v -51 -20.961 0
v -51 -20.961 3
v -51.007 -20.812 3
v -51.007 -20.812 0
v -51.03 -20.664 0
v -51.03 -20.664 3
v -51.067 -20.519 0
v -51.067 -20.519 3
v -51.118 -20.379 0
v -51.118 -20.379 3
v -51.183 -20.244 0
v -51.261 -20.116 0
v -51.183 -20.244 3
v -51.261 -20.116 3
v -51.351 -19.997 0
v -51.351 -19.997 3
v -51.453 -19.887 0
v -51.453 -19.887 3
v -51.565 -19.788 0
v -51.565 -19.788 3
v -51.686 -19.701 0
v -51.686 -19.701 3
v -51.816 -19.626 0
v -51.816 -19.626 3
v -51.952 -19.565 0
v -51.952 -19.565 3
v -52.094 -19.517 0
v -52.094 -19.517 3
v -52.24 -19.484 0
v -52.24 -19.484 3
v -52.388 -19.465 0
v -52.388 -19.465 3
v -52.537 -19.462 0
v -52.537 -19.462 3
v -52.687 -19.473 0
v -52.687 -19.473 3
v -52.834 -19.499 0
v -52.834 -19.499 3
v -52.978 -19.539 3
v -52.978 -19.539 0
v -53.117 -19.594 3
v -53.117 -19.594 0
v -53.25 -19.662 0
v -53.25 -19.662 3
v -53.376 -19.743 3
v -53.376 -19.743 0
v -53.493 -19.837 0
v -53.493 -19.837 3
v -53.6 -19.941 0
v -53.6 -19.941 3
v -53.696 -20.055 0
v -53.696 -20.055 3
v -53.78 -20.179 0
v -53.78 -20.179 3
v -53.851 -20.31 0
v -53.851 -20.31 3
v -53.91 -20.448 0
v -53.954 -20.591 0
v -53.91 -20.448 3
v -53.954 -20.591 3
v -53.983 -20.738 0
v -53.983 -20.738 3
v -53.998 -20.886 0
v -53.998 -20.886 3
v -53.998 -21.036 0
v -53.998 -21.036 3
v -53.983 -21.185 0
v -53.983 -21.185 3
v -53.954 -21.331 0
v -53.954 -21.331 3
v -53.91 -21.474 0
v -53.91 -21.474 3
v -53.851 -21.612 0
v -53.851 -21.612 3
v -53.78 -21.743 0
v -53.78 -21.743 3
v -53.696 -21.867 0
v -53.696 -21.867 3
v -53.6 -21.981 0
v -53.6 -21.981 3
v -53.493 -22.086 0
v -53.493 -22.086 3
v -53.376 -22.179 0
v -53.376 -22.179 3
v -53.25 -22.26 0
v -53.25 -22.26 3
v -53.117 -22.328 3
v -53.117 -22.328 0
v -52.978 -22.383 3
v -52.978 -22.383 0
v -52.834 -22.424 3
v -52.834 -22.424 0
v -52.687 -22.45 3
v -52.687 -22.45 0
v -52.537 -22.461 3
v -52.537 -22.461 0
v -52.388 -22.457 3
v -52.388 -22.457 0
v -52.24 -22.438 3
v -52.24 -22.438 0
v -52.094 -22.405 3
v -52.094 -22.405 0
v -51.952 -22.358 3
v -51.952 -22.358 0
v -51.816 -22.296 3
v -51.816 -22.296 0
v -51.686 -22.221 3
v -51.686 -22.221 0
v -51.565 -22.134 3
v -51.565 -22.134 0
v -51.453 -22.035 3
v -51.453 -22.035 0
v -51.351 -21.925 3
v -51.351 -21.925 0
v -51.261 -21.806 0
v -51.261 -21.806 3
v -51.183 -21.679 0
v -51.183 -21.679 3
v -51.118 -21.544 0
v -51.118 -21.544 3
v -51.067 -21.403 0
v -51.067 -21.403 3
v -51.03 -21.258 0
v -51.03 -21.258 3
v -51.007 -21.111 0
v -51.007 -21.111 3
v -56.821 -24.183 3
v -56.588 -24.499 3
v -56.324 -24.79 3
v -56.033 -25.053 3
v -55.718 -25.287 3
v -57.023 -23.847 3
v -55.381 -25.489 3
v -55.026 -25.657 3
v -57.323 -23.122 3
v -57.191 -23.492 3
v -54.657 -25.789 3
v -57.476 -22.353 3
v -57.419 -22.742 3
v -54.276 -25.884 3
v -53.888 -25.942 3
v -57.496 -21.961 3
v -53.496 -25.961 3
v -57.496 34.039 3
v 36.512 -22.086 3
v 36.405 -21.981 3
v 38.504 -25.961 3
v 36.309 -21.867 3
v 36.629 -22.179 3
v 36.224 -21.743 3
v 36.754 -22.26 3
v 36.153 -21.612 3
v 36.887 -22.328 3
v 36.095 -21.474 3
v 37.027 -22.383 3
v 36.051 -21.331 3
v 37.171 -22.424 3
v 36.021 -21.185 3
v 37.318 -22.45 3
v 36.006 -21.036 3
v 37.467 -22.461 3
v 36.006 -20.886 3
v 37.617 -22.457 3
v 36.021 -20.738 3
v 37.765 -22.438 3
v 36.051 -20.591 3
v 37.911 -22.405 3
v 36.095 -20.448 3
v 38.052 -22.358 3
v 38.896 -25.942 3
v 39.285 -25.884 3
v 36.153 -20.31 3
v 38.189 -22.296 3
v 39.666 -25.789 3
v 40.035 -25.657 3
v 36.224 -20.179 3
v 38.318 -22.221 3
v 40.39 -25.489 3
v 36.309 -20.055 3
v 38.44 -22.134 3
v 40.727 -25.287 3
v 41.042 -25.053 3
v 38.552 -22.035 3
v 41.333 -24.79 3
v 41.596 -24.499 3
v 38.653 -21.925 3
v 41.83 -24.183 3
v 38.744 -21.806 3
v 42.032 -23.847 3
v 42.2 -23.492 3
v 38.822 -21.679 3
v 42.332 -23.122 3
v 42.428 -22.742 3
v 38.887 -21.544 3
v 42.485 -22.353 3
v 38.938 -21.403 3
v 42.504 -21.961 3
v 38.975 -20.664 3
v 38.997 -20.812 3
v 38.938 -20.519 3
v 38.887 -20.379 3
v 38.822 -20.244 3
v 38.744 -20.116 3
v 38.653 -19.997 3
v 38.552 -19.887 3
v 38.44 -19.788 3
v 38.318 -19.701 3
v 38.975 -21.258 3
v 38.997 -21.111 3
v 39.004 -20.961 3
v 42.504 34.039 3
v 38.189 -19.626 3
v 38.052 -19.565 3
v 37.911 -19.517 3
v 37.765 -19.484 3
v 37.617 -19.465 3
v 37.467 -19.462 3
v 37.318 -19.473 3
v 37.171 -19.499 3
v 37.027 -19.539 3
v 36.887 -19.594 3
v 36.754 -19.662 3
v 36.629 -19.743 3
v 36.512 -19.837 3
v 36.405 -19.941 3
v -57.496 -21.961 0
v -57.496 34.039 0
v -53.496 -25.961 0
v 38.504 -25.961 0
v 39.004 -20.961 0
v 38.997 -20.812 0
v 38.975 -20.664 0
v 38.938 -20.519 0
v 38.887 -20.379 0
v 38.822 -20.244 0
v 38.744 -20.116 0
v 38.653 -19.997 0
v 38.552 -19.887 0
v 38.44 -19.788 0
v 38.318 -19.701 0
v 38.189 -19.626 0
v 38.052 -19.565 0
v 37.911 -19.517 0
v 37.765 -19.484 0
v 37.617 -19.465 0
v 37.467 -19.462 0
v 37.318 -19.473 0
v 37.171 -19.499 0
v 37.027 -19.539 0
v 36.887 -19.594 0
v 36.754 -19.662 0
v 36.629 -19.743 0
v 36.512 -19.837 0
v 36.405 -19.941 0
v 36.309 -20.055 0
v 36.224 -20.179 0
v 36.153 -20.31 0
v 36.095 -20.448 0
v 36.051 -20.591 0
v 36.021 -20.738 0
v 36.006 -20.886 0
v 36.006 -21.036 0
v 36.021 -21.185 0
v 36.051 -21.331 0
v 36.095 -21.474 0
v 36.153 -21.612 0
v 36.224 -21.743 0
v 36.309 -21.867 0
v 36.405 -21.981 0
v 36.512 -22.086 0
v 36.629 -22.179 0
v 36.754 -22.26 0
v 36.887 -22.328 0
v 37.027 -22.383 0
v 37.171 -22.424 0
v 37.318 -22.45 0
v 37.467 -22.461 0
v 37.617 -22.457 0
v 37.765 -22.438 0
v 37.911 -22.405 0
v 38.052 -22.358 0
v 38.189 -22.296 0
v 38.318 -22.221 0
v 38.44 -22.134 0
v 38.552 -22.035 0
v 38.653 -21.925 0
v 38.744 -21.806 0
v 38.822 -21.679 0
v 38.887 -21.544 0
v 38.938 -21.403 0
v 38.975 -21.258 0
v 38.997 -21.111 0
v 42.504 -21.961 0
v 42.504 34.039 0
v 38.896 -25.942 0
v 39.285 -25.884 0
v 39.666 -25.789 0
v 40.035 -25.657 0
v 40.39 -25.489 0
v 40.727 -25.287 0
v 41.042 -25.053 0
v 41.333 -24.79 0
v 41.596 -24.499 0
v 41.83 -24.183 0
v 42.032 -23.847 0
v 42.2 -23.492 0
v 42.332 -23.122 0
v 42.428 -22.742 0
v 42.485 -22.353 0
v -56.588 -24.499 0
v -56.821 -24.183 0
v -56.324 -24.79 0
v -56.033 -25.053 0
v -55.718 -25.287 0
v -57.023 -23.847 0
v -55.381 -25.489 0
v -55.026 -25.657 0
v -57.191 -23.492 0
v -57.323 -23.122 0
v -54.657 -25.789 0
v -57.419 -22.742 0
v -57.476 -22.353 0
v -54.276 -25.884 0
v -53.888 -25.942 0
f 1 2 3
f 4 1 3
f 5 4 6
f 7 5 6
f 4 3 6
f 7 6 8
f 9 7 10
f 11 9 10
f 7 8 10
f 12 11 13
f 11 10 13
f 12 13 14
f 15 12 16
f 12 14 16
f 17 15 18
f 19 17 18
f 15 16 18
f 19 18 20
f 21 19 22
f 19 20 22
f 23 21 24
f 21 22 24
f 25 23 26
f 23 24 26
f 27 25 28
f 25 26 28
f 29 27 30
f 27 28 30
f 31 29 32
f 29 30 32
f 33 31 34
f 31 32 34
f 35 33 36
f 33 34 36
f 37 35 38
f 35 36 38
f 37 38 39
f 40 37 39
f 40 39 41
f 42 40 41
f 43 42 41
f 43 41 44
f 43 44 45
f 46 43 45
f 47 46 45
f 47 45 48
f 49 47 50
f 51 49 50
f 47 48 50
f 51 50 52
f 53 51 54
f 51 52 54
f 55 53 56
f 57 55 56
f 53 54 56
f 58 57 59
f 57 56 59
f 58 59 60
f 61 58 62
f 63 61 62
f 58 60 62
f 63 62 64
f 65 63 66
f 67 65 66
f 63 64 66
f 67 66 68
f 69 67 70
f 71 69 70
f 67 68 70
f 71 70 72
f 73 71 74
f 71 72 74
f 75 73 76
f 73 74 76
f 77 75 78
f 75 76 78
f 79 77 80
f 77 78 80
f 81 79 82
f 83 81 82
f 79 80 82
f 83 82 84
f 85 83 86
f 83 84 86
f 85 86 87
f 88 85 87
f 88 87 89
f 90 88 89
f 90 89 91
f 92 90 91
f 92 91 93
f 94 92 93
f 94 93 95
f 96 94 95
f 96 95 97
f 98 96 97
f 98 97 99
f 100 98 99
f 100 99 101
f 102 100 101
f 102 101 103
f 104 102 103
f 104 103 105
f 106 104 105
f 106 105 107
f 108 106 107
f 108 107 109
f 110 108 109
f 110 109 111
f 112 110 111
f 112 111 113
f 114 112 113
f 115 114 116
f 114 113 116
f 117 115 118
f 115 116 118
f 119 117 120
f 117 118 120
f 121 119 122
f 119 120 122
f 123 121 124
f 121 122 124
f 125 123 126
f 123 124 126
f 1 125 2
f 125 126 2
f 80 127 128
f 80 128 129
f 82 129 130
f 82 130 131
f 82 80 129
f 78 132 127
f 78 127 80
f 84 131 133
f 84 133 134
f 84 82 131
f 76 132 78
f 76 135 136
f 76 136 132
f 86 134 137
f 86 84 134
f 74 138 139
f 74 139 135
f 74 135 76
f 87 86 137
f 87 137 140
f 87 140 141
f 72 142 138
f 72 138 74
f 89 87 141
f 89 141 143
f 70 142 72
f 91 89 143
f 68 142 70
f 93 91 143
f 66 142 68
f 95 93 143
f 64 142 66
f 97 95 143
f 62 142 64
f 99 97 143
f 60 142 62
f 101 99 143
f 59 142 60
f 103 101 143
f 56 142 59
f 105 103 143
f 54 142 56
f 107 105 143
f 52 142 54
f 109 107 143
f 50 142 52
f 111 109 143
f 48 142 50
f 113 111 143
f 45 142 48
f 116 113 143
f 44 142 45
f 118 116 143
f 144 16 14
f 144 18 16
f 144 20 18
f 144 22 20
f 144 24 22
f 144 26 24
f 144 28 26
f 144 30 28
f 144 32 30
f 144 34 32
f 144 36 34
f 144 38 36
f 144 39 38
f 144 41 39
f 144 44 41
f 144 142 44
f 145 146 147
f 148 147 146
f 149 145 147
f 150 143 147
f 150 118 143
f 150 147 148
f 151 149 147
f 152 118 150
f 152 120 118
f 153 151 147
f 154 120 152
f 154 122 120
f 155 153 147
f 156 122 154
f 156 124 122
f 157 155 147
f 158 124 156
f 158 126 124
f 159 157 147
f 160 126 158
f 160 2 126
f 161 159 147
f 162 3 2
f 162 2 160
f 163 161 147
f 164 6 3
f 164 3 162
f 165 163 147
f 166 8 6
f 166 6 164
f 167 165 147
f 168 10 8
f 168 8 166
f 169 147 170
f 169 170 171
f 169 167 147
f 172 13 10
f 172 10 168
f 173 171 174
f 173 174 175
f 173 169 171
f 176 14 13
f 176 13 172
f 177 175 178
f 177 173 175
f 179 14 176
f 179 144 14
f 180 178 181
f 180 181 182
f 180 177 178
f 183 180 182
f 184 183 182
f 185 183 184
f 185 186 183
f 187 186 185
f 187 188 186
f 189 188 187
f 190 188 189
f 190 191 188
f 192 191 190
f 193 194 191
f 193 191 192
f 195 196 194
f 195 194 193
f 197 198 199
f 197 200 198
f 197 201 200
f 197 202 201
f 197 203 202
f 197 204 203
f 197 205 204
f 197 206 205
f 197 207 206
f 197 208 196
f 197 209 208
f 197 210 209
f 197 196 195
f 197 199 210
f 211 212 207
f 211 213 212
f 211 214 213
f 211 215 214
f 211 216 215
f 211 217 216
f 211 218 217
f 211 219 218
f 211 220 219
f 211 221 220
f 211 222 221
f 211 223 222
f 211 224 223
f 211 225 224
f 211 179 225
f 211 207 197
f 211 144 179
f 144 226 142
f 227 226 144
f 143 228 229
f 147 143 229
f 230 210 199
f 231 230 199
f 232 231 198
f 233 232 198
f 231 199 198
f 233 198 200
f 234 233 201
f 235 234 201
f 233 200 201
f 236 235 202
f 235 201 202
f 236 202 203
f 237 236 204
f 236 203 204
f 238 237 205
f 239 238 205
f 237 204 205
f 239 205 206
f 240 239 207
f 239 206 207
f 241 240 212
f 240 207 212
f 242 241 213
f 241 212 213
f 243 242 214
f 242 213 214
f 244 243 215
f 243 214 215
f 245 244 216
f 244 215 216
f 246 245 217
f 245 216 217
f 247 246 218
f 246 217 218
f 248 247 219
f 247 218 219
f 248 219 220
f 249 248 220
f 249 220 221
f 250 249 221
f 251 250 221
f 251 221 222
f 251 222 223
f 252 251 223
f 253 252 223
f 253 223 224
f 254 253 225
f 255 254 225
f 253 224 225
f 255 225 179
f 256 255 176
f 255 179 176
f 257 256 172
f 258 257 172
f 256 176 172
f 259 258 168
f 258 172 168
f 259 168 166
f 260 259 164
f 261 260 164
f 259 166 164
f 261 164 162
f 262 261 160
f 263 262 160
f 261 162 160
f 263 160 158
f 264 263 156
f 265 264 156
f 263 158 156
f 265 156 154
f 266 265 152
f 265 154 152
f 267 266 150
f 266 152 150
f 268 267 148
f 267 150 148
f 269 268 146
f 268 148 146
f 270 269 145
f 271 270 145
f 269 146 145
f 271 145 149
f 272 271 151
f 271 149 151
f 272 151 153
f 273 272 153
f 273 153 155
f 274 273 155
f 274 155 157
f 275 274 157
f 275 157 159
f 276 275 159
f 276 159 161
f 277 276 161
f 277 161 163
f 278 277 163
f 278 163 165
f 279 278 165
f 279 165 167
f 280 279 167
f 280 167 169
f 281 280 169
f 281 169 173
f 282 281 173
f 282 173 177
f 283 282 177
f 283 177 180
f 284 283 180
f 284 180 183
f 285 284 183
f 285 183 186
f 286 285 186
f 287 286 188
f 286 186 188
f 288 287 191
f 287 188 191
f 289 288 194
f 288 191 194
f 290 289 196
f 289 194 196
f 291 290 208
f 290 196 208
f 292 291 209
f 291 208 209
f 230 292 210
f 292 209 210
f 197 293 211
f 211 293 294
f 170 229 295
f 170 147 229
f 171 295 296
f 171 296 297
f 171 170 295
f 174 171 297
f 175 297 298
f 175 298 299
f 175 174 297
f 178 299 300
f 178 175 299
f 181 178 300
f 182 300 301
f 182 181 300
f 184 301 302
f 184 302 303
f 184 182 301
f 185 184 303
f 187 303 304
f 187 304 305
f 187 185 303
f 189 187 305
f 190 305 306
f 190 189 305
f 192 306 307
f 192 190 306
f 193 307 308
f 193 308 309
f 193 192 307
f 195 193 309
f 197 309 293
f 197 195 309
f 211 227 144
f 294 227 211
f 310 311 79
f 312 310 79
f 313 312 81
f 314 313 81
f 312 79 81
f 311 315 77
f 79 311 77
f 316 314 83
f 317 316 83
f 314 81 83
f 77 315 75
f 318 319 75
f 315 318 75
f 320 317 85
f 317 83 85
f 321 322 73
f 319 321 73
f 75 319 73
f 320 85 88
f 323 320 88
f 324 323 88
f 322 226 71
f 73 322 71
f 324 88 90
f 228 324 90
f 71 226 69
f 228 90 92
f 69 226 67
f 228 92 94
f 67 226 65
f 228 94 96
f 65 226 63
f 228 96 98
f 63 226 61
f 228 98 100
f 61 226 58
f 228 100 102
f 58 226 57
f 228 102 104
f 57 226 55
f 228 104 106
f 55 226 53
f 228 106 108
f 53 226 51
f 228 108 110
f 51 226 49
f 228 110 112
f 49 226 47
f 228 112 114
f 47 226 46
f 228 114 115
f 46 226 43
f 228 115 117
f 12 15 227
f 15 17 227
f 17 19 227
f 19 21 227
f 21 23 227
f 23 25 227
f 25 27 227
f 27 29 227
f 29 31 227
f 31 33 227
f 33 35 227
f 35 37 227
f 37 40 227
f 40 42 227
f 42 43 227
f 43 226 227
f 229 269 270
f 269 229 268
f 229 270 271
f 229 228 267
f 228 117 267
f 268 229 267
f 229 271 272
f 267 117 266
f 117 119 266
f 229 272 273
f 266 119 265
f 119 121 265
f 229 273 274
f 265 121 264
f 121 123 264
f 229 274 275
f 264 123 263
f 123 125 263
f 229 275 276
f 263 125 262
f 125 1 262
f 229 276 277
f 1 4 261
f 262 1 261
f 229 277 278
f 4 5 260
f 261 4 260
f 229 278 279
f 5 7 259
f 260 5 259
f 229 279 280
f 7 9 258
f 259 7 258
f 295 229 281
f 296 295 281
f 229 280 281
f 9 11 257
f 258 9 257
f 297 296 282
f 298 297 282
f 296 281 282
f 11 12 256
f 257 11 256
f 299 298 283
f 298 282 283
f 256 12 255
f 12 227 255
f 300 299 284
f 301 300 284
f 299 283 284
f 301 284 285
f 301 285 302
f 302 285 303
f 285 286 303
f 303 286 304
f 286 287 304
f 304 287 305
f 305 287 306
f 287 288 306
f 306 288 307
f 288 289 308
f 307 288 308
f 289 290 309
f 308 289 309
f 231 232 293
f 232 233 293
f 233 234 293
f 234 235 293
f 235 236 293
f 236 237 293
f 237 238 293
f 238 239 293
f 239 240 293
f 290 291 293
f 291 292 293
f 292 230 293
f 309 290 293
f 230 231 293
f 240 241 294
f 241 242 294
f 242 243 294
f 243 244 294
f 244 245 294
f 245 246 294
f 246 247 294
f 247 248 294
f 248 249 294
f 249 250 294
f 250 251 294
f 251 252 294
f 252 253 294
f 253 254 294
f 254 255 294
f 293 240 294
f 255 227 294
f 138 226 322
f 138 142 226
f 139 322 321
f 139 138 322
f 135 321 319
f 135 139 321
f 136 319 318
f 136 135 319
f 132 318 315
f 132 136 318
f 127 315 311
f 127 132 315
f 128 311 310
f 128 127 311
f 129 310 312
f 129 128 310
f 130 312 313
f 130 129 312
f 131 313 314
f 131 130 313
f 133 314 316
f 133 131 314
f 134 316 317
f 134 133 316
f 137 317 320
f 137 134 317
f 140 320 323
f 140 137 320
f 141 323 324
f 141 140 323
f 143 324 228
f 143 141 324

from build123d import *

# Parameters (mm, degrees)
SKETCH1_W           = 100
SKETCH1_H           = 60
BOSS_EXTRUDE1_DEPTH = 3
SKETCH2_R           = 1.5
CUT_EXTRUDE1_DEPTH  = 3
FILLET1_R           = 4


with BuildPart() as part:
    # Sketch1 → Boss-Extrude1 (new body)
    with BuildSketch(Plane.XY):
        with Locations((-7.495590829, 4.038800705)):
            Rectangle(SKETCH1_W, SKETCH1_H)
    extrude(amount=BOSS_EXTRUDE1_DEPTH)

    # Sketch2 → Cut-Extrude1 (cut)
    with BuildSketch(Plane.XY.offset(3)):
        with Locations((37.504409171, -20.961199295)):
            Circle(SKETCH2_R)
        with Locations((-52.500025419, -20.961199295)):
            Circle(SKETCH2_R)
    extrude(amount=-CUT_EXTRUDE1_DEPTH, mode=Mode.SUBTRACT)

    # Fillet1
    fillet1_edges = [part.edges().sort_by_distance(p)[0] for p in [
        (42.504409171, -25.961199295, 1.5),
        (-57.495590829, -25.961199295, 1.5),
    ]]
    fillet(fillet1_edges, radius=FILLET1_R)


solid = part.part
